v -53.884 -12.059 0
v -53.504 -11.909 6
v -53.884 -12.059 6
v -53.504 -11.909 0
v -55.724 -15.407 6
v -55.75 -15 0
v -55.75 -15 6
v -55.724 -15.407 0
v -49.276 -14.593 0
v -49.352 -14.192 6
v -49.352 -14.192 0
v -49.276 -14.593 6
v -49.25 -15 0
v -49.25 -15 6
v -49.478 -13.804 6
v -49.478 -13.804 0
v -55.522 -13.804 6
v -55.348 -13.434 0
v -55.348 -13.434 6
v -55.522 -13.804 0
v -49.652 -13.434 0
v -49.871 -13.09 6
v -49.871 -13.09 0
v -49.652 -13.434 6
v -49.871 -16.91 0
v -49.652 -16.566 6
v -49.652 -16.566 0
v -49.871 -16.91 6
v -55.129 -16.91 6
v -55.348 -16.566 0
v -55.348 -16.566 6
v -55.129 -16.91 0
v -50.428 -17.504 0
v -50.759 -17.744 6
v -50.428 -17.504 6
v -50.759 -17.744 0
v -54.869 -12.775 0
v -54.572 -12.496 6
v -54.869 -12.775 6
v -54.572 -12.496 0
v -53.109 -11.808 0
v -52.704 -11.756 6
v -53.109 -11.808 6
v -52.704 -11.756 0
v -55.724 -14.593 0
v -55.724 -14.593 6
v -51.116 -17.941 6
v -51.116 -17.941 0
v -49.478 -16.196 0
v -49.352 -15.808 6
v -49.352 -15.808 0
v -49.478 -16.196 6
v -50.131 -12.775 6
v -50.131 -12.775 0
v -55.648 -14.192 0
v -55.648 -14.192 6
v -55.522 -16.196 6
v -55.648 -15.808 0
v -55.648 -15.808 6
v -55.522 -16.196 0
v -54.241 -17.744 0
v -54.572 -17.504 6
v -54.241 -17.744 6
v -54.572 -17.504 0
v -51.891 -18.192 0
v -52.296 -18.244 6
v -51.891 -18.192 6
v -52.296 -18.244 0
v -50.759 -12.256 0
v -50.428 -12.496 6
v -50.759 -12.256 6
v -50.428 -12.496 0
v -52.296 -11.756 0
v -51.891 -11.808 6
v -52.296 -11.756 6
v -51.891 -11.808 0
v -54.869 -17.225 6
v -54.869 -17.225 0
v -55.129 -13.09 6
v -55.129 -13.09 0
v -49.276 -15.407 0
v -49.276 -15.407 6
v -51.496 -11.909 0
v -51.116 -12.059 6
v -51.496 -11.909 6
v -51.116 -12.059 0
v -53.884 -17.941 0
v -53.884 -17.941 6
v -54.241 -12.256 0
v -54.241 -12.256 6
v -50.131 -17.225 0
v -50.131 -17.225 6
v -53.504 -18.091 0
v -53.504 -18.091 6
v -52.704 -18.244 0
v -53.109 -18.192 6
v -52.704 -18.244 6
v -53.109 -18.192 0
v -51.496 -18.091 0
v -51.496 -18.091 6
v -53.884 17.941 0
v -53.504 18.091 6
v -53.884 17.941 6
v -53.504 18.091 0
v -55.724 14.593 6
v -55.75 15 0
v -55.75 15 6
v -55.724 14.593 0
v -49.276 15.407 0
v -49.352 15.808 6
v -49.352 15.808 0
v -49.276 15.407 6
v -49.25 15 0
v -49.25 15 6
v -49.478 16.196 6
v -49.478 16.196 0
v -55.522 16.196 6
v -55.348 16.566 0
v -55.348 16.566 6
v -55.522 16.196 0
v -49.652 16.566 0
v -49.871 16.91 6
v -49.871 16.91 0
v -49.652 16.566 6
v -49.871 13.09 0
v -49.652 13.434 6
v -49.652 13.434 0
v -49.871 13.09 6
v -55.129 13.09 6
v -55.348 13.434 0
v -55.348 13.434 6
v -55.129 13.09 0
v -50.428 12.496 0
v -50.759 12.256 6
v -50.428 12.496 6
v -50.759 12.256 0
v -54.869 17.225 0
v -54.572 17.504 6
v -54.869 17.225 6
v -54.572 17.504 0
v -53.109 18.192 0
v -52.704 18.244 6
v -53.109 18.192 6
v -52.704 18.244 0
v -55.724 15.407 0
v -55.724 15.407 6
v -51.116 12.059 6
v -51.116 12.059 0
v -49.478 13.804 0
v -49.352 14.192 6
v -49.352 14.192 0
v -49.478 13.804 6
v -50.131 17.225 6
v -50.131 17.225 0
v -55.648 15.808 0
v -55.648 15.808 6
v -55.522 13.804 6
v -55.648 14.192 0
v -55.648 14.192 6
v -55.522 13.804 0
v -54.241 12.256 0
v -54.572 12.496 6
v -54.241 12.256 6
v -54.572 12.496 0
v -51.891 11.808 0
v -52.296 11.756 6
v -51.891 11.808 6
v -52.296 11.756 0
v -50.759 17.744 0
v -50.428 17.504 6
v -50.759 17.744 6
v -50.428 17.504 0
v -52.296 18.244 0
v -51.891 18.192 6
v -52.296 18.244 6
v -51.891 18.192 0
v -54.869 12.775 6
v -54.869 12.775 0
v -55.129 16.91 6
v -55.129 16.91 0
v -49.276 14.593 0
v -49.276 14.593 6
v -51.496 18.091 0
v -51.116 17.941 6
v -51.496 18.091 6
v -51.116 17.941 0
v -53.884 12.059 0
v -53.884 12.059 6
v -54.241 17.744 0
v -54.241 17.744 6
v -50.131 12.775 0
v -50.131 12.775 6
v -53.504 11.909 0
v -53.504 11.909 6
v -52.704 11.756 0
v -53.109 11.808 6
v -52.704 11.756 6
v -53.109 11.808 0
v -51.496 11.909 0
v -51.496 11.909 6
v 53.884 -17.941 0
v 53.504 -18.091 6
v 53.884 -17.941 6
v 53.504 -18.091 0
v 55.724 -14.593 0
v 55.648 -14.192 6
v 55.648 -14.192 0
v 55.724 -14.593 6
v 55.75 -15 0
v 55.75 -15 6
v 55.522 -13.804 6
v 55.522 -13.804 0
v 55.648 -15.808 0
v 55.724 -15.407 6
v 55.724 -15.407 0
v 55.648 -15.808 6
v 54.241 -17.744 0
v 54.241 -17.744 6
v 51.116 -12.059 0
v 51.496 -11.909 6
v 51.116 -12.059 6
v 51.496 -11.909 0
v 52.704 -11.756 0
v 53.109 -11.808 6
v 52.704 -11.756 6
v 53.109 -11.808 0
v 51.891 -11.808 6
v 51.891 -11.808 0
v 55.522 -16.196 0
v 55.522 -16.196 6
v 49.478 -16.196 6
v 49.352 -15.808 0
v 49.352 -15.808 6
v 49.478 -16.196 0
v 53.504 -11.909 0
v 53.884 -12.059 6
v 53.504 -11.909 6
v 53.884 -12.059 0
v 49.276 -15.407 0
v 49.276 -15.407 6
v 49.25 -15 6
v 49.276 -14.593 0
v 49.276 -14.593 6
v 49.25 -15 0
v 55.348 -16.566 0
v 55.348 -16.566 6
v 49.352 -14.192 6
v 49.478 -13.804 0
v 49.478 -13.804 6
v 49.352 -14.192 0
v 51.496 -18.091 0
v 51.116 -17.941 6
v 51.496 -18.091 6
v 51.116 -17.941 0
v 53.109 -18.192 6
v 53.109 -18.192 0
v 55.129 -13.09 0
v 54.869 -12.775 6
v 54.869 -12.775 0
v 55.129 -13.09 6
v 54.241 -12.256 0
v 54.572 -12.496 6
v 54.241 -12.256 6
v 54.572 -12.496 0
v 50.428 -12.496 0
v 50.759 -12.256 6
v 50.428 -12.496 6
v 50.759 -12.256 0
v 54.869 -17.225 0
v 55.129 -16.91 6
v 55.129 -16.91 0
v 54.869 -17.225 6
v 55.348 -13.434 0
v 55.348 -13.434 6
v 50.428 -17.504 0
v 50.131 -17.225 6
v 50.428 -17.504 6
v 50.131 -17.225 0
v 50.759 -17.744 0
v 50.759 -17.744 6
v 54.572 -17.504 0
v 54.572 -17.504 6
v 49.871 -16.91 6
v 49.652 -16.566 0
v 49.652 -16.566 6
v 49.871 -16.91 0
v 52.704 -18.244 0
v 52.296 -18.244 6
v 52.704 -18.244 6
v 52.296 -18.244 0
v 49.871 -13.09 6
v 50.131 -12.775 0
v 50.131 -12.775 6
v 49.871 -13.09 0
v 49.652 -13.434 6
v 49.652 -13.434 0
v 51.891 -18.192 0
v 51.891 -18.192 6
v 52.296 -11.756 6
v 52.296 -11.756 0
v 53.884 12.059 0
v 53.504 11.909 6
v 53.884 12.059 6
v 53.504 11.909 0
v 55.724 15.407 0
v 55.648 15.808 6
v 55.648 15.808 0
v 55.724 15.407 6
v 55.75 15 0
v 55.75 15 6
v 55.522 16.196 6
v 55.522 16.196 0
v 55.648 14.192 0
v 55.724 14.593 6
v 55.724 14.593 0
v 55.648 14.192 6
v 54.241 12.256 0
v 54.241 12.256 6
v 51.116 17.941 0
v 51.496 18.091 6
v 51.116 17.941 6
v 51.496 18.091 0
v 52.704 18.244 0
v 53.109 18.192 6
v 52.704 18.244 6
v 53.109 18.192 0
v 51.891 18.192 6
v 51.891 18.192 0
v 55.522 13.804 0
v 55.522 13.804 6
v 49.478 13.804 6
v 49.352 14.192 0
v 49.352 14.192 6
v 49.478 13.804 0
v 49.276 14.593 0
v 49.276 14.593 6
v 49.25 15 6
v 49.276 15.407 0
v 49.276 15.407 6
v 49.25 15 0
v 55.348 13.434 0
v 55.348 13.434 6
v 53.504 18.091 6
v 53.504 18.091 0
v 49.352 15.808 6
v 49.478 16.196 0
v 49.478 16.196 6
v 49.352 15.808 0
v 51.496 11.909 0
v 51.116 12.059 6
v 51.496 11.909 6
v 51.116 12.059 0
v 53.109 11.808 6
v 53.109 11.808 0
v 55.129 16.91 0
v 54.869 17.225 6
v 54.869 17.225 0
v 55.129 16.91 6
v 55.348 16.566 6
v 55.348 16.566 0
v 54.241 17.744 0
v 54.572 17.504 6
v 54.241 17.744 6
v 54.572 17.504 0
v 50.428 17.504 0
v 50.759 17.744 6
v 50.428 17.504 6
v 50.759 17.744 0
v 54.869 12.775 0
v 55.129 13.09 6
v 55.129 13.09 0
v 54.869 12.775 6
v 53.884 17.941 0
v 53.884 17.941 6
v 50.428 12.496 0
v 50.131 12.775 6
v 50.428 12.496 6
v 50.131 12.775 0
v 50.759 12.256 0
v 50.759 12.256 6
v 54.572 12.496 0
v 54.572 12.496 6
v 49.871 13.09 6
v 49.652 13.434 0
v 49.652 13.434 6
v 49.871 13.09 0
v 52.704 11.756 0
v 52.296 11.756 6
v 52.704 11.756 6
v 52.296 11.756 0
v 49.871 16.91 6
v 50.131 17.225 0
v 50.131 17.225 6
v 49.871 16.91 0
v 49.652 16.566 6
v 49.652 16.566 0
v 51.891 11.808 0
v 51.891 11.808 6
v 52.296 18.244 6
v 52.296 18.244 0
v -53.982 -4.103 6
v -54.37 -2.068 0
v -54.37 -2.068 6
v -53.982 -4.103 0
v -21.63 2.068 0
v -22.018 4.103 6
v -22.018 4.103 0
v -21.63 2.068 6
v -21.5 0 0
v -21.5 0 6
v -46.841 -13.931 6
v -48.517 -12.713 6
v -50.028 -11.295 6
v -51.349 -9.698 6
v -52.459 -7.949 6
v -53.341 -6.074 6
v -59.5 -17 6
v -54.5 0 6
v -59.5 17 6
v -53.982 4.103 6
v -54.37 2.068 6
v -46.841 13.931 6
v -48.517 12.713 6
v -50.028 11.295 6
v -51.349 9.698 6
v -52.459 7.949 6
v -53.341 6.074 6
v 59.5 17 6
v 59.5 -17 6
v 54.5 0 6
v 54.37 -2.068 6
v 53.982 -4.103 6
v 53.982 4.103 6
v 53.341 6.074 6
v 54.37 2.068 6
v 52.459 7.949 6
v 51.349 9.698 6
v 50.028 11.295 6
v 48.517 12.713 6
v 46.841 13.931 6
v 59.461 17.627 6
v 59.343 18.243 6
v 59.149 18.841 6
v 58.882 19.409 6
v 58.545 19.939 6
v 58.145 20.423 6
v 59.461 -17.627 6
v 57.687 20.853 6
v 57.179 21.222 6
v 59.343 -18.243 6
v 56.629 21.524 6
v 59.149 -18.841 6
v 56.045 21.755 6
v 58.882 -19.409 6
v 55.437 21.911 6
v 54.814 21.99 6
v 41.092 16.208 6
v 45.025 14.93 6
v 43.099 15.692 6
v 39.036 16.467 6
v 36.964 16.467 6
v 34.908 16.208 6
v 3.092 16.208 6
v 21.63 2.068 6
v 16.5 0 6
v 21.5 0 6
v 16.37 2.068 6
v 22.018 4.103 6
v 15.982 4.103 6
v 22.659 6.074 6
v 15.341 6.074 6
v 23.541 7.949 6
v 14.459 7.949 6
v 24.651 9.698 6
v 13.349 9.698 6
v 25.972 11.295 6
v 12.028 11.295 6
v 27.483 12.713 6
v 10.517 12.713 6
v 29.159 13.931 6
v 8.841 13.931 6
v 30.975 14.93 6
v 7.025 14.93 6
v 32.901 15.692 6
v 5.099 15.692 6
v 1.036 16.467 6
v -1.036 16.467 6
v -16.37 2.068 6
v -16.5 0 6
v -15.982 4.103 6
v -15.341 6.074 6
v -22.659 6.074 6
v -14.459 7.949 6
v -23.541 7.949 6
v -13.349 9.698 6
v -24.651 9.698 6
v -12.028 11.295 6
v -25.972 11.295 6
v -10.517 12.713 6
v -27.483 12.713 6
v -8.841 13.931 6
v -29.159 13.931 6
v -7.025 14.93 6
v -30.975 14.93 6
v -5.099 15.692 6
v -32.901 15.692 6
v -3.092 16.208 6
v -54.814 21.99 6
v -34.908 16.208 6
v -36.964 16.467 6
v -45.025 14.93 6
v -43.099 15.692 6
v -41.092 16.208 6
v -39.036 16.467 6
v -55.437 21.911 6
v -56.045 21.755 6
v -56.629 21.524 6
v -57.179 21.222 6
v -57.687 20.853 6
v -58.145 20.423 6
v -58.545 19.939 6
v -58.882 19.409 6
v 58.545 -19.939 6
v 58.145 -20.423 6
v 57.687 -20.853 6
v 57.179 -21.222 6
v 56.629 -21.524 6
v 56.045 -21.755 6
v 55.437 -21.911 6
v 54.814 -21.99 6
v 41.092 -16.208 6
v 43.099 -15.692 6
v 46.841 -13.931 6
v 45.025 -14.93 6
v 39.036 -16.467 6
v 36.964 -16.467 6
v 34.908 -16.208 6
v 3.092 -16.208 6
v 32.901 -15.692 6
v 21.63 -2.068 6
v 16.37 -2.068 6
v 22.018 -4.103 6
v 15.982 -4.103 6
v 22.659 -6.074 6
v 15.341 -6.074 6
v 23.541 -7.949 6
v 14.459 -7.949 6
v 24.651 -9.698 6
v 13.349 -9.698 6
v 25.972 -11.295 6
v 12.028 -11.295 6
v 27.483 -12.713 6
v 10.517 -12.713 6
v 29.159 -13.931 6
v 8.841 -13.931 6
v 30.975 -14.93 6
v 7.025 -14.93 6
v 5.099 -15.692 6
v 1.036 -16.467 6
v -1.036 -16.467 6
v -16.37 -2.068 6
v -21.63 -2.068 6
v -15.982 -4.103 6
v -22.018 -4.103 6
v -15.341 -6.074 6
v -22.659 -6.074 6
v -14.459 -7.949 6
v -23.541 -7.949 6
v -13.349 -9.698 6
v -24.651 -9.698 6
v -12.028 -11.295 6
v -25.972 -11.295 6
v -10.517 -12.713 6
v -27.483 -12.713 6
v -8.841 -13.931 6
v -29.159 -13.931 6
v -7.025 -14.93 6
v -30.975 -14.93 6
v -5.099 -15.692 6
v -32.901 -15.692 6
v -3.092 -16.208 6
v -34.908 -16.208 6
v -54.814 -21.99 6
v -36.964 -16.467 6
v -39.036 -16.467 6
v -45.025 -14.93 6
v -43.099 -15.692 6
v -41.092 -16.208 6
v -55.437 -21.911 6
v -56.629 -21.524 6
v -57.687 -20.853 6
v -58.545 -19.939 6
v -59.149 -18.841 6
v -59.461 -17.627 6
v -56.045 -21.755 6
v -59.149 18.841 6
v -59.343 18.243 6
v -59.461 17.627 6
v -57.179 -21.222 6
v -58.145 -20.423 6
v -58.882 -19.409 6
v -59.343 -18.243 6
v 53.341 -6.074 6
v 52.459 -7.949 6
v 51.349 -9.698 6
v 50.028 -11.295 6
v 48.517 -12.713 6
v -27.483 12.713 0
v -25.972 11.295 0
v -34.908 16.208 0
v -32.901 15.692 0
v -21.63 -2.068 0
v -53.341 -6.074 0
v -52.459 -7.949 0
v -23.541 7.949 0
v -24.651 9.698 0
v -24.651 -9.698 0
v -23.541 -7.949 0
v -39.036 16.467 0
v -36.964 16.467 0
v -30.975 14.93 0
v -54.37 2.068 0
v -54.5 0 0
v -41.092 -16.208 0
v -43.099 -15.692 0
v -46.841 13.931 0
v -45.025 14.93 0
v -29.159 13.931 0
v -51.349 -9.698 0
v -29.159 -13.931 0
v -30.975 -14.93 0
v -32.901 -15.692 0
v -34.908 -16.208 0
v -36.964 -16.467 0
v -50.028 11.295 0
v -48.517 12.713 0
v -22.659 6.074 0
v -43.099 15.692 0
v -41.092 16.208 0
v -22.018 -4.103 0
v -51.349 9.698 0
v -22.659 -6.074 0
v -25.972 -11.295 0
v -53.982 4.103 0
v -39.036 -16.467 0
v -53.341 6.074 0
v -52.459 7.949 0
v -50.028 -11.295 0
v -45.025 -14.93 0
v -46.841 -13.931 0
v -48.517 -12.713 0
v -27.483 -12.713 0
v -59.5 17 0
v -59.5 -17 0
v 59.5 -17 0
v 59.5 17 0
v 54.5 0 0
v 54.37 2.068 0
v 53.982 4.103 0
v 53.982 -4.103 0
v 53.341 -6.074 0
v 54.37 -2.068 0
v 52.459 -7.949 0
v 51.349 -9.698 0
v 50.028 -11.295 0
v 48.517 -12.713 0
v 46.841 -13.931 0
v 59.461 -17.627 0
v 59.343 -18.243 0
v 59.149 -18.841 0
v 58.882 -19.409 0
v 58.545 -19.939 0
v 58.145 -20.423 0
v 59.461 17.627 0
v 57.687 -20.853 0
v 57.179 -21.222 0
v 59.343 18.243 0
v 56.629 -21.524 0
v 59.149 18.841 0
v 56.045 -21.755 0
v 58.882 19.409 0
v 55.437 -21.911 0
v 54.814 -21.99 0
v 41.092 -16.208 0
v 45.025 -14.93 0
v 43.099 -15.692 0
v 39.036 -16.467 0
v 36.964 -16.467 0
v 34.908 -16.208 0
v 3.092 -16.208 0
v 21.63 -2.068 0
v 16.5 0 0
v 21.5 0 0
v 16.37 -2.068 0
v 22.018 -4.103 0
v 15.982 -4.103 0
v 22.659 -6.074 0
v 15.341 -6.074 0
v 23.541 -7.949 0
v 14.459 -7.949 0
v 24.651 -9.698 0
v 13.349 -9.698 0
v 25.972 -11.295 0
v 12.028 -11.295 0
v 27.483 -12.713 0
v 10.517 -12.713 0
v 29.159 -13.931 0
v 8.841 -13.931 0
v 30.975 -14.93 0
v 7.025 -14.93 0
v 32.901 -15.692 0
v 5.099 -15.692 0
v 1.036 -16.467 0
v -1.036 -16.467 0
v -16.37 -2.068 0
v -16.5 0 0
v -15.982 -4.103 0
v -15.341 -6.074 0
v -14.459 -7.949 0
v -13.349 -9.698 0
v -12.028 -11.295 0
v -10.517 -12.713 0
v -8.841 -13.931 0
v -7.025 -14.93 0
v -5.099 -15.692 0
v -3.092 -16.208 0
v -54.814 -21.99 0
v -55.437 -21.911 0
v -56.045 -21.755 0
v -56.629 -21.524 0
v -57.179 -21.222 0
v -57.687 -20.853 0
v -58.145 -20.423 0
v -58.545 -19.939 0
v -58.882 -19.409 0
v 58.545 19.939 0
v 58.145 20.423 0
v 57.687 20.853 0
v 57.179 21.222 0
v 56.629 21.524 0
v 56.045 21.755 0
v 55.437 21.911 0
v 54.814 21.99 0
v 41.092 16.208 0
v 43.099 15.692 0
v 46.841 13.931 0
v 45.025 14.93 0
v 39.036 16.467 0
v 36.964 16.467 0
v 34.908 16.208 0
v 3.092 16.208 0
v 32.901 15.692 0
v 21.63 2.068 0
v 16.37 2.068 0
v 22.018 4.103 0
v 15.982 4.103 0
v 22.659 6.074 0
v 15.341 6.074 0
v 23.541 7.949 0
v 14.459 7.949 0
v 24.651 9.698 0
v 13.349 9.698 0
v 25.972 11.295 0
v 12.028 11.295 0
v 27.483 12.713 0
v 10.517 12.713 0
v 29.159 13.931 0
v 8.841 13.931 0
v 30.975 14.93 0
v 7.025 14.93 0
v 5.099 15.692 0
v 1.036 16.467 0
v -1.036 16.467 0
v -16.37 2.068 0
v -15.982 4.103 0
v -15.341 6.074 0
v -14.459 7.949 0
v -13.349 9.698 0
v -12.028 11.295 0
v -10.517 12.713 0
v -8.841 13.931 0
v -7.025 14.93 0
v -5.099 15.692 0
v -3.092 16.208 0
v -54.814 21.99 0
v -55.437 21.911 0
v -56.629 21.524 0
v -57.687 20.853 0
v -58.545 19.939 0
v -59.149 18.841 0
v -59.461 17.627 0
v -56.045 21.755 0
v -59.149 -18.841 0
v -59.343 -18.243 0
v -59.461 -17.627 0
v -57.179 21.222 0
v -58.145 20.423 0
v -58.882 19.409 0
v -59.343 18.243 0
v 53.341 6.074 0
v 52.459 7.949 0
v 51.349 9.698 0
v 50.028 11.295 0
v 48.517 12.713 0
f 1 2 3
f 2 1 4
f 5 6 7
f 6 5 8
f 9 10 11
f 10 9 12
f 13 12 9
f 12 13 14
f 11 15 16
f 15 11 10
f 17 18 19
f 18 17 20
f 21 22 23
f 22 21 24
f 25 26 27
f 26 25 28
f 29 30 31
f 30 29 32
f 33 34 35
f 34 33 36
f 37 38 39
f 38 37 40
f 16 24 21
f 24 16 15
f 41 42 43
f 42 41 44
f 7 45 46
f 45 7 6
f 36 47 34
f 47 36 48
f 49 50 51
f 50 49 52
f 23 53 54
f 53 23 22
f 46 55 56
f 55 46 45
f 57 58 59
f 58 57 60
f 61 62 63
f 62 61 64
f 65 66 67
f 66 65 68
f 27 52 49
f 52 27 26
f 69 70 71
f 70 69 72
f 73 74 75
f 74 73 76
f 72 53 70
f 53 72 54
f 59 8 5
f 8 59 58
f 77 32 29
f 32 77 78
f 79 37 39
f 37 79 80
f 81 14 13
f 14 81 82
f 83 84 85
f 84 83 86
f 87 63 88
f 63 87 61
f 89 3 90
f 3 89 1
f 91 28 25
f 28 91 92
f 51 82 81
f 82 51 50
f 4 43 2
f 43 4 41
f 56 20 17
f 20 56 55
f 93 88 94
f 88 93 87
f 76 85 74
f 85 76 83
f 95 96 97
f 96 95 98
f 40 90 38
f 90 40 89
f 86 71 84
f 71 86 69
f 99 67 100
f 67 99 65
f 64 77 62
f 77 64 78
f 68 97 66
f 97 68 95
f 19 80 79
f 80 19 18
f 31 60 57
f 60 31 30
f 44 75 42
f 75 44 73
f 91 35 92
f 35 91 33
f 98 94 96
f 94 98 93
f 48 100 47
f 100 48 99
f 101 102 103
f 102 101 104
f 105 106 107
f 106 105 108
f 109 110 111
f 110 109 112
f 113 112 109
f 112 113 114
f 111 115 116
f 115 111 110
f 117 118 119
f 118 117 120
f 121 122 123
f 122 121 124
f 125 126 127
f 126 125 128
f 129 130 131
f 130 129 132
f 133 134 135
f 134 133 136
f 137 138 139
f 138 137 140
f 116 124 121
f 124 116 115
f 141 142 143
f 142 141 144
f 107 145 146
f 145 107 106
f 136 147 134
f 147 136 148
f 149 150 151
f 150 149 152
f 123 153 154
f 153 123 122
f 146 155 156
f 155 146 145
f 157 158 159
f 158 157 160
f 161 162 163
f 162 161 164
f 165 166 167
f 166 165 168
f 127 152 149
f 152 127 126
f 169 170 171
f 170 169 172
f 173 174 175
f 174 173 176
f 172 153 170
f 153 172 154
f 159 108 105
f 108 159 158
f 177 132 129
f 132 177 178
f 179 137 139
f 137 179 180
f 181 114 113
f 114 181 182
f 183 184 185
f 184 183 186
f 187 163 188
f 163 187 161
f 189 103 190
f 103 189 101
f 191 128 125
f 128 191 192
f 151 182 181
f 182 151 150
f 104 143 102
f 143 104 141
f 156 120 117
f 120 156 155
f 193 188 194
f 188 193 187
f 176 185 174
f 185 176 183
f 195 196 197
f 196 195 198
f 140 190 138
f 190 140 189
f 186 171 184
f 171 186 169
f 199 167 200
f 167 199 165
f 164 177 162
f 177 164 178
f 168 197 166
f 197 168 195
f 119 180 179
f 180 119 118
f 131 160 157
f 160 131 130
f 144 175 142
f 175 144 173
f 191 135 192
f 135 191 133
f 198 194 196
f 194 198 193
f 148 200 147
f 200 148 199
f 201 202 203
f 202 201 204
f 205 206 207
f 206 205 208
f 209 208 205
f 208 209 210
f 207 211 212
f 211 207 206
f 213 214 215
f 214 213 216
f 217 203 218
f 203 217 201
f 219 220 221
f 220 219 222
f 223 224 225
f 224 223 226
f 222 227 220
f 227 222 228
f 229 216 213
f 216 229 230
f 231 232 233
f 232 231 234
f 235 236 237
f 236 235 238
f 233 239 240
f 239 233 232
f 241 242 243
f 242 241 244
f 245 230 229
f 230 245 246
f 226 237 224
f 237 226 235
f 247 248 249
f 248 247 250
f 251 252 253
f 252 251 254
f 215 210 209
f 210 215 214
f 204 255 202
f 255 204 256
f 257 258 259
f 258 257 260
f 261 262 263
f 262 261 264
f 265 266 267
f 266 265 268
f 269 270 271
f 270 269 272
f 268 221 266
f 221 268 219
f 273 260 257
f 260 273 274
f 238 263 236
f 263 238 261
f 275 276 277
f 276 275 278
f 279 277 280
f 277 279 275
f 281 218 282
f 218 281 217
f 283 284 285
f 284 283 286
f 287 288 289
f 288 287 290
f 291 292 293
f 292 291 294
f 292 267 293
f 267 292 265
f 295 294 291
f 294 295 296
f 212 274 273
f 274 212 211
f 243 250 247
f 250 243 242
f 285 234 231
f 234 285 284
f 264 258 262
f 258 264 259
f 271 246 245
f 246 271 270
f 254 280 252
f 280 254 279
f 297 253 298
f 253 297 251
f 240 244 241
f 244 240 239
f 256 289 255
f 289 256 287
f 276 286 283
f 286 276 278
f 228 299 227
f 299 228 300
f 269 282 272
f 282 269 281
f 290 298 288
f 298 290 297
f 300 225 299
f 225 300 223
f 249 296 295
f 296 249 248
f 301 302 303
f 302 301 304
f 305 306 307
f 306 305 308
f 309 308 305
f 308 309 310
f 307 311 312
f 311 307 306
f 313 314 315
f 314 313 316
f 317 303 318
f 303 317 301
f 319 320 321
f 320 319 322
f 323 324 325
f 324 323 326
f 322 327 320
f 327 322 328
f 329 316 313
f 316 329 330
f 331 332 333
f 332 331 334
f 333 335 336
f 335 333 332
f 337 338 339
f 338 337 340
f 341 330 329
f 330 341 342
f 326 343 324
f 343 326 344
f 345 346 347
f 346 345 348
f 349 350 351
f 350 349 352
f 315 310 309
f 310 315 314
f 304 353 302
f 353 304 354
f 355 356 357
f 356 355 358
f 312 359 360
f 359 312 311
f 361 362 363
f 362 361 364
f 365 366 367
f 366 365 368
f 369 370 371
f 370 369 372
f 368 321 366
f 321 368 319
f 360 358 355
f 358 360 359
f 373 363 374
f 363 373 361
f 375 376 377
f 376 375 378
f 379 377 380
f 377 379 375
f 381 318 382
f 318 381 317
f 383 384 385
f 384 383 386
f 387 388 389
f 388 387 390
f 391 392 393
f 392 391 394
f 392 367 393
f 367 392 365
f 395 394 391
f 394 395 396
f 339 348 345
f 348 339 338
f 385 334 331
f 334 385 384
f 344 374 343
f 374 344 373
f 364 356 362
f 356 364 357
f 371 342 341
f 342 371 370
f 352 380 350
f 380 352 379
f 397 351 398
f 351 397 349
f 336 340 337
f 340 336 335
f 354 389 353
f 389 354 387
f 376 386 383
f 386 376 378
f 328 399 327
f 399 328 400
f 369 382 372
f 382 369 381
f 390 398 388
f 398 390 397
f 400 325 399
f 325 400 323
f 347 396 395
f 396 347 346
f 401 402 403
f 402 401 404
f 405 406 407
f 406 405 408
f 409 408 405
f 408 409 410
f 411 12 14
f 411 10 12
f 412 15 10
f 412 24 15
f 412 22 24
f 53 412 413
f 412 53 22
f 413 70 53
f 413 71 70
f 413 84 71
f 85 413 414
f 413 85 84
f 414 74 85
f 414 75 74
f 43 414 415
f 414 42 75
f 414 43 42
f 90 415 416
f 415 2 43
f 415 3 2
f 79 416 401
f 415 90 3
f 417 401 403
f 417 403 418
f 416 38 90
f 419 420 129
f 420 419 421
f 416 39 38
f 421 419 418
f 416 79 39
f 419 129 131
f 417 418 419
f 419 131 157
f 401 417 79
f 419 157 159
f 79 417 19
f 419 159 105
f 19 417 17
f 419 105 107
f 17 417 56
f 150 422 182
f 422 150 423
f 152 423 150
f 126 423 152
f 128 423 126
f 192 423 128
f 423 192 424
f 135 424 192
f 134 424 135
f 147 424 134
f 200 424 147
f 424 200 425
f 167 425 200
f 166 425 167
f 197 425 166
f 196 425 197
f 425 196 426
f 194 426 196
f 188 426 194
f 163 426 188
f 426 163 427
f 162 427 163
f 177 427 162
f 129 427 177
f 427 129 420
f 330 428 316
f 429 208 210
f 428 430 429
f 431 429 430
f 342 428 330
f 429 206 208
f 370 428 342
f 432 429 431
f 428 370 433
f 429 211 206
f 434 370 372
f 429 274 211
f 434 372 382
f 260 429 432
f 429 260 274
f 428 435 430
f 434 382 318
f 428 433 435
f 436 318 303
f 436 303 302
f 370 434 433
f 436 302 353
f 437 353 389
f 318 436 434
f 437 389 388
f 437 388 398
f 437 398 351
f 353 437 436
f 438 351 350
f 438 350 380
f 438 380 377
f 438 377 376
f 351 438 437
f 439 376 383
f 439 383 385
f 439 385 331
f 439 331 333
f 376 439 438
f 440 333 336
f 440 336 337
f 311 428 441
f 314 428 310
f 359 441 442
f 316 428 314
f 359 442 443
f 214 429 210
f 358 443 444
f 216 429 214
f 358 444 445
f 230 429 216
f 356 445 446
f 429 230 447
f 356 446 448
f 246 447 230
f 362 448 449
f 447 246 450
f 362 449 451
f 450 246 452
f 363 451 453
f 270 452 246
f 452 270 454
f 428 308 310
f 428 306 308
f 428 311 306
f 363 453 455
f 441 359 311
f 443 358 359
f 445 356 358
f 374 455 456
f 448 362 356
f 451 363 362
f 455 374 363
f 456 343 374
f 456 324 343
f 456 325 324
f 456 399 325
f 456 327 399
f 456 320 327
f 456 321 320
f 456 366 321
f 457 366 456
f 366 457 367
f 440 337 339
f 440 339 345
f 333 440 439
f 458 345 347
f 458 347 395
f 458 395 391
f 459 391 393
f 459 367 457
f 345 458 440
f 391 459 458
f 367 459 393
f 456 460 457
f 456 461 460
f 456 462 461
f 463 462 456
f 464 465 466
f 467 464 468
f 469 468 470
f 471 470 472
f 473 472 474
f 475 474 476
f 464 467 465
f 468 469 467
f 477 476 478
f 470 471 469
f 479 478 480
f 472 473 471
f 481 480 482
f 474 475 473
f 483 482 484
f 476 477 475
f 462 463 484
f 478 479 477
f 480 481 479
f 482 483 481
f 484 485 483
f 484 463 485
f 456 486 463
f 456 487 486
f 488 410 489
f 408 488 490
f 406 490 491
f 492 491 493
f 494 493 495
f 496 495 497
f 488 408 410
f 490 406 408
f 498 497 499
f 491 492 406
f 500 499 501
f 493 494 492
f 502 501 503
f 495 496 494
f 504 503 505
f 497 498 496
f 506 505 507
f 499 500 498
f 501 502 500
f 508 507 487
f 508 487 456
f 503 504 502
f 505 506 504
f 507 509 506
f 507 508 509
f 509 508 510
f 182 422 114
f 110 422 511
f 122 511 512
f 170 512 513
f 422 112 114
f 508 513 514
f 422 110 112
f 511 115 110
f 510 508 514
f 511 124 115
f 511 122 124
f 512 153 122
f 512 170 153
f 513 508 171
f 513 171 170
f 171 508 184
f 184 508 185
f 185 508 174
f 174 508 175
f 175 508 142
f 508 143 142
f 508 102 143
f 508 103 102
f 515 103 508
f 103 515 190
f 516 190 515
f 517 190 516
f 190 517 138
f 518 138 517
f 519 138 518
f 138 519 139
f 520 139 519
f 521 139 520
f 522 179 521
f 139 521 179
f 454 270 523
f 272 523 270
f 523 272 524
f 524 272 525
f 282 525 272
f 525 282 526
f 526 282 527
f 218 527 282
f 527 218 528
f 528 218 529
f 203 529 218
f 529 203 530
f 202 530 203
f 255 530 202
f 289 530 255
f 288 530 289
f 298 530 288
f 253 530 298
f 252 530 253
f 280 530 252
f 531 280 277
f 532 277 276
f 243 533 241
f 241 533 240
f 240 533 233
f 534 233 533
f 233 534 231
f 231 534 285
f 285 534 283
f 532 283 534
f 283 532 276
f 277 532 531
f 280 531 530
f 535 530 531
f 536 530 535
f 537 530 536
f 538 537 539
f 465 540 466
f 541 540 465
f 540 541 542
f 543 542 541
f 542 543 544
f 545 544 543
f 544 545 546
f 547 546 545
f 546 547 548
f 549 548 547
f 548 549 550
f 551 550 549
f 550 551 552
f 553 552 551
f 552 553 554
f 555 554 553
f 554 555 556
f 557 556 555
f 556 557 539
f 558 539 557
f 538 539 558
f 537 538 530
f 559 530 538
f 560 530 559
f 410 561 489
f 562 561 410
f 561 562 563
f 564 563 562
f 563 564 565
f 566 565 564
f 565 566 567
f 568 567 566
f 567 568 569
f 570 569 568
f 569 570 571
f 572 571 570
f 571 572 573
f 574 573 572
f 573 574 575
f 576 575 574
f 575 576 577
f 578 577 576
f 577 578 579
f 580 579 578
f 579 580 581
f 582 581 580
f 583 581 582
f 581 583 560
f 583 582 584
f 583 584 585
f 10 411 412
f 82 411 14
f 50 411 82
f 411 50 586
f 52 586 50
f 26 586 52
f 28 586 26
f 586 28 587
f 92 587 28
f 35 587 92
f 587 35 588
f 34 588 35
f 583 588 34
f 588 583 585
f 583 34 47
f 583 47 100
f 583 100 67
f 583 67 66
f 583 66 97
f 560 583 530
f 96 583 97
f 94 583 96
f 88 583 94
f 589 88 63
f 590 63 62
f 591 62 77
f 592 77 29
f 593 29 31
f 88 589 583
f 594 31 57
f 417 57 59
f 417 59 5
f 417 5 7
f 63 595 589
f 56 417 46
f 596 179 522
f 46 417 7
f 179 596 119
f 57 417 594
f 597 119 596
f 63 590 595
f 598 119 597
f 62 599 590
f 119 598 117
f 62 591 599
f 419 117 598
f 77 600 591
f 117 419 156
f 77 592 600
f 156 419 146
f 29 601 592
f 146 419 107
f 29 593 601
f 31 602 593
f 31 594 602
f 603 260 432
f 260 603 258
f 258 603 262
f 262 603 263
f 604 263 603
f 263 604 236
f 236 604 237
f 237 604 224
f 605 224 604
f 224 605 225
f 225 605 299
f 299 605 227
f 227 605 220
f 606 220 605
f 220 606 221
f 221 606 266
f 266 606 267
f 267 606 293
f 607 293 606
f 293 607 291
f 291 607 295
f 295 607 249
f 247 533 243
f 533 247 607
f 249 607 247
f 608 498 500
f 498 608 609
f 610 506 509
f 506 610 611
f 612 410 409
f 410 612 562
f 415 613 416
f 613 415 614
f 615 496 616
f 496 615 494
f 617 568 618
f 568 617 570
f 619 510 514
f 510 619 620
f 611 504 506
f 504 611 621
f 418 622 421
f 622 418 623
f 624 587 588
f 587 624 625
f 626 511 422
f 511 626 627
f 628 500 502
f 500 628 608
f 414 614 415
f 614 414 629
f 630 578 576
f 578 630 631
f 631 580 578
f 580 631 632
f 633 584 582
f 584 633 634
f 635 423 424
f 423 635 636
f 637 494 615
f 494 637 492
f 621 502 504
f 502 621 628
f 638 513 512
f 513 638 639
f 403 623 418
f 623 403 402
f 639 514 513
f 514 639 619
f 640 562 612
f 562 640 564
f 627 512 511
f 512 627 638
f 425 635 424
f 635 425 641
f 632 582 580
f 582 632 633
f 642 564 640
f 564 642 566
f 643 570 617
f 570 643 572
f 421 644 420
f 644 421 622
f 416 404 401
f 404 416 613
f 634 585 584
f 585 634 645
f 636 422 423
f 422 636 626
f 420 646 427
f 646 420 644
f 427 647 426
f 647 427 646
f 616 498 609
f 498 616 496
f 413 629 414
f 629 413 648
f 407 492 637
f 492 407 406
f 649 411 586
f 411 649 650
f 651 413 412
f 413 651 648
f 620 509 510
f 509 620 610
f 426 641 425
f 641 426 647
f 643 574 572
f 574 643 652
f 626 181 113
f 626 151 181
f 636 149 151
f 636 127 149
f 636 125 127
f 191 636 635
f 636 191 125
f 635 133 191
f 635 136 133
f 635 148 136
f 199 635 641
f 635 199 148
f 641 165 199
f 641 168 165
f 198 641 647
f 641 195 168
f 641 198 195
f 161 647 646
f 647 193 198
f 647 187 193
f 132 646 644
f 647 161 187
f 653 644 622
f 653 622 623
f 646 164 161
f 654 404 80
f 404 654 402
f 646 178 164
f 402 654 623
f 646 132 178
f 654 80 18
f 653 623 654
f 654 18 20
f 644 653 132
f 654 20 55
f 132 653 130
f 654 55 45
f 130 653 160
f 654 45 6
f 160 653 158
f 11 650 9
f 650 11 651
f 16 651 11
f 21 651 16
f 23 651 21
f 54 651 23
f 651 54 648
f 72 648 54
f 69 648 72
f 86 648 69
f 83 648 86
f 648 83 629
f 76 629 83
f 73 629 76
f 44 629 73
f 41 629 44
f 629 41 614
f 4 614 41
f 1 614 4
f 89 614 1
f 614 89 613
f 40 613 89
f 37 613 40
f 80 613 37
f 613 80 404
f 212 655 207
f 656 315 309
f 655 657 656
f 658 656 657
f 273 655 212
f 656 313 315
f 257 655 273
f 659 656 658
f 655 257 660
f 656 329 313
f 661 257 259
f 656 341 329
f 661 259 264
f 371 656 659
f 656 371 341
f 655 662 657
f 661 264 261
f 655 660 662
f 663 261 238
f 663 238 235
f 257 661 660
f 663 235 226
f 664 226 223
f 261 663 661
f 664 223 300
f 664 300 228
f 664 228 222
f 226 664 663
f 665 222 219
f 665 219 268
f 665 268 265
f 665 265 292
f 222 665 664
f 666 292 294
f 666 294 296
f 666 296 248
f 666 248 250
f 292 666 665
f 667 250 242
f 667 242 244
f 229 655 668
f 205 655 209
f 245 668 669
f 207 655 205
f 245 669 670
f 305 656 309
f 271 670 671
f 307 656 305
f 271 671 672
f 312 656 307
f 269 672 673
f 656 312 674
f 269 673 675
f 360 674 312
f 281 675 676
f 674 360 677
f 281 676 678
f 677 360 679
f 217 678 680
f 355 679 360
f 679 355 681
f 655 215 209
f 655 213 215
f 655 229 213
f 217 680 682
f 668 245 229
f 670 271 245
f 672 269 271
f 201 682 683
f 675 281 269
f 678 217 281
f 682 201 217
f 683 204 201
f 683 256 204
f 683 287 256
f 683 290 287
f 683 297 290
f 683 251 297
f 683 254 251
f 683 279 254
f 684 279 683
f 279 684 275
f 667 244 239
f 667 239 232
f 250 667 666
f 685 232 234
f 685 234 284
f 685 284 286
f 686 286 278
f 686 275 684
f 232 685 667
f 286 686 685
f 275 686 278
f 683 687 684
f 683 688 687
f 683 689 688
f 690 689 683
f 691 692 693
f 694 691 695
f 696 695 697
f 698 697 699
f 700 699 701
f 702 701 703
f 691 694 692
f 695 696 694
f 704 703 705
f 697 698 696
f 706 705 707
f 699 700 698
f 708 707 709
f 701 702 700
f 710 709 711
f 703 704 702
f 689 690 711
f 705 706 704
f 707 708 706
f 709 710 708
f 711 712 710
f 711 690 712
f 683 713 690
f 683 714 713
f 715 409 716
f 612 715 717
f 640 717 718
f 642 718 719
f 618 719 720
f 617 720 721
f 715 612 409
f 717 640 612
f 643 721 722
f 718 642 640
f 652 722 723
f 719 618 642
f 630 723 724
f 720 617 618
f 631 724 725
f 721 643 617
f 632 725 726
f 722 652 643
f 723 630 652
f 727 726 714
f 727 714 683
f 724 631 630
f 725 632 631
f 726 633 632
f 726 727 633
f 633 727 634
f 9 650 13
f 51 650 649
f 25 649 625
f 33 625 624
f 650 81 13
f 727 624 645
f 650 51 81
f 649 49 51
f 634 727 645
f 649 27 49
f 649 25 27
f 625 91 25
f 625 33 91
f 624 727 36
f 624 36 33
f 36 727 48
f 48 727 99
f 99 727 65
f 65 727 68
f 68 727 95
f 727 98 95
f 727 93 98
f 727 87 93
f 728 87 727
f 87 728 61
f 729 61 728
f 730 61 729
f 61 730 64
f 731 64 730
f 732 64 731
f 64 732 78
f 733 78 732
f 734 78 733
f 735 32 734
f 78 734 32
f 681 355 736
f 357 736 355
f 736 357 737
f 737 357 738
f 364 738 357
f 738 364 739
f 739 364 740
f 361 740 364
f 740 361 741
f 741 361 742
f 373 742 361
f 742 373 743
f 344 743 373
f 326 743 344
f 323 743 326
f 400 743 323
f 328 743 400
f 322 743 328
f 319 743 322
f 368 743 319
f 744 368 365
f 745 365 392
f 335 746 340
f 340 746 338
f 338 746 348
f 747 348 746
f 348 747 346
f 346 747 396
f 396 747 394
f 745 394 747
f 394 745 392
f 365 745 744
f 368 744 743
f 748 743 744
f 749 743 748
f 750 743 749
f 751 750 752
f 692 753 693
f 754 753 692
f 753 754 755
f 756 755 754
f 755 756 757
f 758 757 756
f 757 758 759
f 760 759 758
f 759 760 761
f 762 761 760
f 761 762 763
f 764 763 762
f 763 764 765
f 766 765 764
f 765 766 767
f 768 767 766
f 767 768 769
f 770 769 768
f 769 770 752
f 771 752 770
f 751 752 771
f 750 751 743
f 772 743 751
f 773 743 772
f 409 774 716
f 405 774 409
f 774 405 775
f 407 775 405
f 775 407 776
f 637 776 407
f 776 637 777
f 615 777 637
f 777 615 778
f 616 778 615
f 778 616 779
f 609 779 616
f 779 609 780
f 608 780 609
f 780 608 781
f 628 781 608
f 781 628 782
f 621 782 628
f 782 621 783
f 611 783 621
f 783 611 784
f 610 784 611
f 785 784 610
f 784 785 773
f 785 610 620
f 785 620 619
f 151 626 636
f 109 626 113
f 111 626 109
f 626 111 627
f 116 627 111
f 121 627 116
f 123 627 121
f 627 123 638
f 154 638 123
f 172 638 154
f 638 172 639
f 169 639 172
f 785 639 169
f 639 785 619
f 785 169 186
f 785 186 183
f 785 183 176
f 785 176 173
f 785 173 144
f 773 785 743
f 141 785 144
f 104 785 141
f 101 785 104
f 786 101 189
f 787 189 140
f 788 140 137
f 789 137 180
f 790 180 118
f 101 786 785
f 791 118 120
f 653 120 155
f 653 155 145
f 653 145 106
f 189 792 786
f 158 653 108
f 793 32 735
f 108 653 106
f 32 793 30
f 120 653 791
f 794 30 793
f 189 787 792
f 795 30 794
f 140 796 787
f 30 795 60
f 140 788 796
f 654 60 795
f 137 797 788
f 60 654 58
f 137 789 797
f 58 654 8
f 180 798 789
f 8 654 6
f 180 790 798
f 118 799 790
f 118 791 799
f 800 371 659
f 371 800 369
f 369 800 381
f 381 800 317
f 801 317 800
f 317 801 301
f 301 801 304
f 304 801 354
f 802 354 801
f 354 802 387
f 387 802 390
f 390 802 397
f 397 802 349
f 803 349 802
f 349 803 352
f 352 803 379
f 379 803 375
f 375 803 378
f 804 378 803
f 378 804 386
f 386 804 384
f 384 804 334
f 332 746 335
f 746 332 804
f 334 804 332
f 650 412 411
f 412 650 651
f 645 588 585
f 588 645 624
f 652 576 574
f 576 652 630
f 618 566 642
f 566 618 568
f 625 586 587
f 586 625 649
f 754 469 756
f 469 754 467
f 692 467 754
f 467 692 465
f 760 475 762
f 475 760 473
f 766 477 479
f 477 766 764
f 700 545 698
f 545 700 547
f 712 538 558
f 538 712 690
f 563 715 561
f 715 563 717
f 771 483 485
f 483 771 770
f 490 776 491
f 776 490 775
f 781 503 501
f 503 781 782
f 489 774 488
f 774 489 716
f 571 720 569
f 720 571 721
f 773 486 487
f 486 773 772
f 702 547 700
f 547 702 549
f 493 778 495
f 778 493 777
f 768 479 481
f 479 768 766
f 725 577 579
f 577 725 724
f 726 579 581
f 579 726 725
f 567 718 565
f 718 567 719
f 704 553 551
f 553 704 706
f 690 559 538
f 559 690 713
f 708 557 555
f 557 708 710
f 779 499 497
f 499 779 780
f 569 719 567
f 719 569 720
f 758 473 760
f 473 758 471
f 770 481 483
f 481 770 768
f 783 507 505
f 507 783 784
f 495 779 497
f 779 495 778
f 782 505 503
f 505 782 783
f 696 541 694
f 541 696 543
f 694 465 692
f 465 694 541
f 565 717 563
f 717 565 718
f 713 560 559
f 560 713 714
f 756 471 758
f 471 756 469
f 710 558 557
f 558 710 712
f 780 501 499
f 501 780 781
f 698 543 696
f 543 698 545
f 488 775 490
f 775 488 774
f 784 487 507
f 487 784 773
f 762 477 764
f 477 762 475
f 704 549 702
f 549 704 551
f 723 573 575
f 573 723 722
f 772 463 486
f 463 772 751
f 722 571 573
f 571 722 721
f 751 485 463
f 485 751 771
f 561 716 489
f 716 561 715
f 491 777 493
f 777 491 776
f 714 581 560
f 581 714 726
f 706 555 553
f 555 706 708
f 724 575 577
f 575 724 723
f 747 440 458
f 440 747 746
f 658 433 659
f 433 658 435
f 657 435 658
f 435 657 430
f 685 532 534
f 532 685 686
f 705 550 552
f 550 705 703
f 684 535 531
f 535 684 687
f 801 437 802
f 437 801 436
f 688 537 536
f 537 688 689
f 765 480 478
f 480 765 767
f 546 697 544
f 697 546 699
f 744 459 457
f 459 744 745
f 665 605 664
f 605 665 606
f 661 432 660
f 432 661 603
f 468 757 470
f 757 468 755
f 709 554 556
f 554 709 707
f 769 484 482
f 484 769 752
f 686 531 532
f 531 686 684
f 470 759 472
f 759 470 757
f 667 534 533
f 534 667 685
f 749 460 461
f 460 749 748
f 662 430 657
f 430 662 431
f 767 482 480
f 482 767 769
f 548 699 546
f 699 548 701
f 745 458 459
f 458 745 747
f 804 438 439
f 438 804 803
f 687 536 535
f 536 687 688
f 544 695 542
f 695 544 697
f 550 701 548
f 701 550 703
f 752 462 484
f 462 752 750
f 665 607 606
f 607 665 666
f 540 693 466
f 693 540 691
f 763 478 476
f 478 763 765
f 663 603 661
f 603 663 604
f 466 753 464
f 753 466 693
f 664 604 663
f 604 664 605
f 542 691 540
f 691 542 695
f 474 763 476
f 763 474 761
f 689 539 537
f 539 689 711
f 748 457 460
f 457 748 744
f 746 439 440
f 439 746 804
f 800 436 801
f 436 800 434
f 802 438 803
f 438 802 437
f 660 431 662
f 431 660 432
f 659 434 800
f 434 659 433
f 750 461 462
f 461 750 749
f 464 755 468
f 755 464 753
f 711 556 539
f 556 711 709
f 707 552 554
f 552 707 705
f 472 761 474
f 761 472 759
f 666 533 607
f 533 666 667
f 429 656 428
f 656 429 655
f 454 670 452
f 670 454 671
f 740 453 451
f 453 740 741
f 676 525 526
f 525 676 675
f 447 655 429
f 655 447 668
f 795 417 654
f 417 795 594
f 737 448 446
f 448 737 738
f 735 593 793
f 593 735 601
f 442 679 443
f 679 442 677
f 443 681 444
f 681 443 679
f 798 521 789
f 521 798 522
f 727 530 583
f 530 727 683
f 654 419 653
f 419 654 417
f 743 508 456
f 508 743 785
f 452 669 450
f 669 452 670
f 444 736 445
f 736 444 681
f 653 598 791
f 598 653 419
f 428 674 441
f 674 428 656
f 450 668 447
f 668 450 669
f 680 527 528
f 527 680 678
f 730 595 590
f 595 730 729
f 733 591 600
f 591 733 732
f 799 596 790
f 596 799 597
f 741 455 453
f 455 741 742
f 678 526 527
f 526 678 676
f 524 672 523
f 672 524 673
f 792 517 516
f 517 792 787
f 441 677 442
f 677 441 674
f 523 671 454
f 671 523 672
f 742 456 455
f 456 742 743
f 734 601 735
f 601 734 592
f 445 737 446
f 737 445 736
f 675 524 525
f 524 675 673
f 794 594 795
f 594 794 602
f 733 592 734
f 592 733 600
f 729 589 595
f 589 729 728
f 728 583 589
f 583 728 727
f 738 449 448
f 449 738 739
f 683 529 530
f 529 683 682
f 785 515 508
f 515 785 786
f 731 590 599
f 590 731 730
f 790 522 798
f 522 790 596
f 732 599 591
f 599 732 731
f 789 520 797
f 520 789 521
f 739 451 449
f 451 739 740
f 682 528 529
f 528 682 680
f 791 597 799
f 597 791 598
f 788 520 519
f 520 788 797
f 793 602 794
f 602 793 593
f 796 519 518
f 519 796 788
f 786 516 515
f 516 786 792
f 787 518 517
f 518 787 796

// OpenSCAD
$fn = 50;

difference() {
	union() {
		hull() {
			translate(v = [-54.5, 17.0, 0]) {
				cylinder(h = 6, r = 5);
			}
			translate(v = [54.5, 17.0, 0]) {
				cylinder(h = 6, r = 5);
			}
			translate(v = [-54.5, -17.0, 0]) {
				cylinder(h = 6, r = 5);
			}
			translate(v = [54.5, -17.0, 0]) {
				cylinder(h = 6, r = 5);
			}
		}
	}
	union() {
		translate(v = [-52.5, -15.0, -100.0]) {
			cylinder(h = 200, r = 3.25);
		}
		translate(v = [-52.5, 15.0, -100.0]) {
			cylinder(h = 200, r = 3.25);
		}
		translate(v = [52.5, -15.0, -100.0]) {
			cylinder(h = 200, r = 3.25);
		}
		translate(v = [52.5, 15.0, -100.0]) {
			cylinder(h = 200, r = 3.25);
		}
		translate(v = [-52.5, -15.0, -100.0]) {
			cylinder(h = 200, r = 1.8);
		}
		translate(v = [-52.5, 15.0, -100.0]) {
			cylinder(h = 200, r = 1.8);
		}
		translate(v = [52.5, -15.0, -100.0]) {
			cylinder(h = 200, r = 1.8);
		}
		translate(v = [52.5, 15.0, -100.0]) {
			cylinder(h = 200, r = 1.8);
		}
		translate(v = [-38.0, 0, 0.0]) {
			cylinder(h = 6, r = 16.5);
		}
		cylinder(h = 6, r = 16.5);
		translate(v = [38.0, 0, 0.0]) {
			cylinder(h = 6, r = 16.5);
		}
	}
}
